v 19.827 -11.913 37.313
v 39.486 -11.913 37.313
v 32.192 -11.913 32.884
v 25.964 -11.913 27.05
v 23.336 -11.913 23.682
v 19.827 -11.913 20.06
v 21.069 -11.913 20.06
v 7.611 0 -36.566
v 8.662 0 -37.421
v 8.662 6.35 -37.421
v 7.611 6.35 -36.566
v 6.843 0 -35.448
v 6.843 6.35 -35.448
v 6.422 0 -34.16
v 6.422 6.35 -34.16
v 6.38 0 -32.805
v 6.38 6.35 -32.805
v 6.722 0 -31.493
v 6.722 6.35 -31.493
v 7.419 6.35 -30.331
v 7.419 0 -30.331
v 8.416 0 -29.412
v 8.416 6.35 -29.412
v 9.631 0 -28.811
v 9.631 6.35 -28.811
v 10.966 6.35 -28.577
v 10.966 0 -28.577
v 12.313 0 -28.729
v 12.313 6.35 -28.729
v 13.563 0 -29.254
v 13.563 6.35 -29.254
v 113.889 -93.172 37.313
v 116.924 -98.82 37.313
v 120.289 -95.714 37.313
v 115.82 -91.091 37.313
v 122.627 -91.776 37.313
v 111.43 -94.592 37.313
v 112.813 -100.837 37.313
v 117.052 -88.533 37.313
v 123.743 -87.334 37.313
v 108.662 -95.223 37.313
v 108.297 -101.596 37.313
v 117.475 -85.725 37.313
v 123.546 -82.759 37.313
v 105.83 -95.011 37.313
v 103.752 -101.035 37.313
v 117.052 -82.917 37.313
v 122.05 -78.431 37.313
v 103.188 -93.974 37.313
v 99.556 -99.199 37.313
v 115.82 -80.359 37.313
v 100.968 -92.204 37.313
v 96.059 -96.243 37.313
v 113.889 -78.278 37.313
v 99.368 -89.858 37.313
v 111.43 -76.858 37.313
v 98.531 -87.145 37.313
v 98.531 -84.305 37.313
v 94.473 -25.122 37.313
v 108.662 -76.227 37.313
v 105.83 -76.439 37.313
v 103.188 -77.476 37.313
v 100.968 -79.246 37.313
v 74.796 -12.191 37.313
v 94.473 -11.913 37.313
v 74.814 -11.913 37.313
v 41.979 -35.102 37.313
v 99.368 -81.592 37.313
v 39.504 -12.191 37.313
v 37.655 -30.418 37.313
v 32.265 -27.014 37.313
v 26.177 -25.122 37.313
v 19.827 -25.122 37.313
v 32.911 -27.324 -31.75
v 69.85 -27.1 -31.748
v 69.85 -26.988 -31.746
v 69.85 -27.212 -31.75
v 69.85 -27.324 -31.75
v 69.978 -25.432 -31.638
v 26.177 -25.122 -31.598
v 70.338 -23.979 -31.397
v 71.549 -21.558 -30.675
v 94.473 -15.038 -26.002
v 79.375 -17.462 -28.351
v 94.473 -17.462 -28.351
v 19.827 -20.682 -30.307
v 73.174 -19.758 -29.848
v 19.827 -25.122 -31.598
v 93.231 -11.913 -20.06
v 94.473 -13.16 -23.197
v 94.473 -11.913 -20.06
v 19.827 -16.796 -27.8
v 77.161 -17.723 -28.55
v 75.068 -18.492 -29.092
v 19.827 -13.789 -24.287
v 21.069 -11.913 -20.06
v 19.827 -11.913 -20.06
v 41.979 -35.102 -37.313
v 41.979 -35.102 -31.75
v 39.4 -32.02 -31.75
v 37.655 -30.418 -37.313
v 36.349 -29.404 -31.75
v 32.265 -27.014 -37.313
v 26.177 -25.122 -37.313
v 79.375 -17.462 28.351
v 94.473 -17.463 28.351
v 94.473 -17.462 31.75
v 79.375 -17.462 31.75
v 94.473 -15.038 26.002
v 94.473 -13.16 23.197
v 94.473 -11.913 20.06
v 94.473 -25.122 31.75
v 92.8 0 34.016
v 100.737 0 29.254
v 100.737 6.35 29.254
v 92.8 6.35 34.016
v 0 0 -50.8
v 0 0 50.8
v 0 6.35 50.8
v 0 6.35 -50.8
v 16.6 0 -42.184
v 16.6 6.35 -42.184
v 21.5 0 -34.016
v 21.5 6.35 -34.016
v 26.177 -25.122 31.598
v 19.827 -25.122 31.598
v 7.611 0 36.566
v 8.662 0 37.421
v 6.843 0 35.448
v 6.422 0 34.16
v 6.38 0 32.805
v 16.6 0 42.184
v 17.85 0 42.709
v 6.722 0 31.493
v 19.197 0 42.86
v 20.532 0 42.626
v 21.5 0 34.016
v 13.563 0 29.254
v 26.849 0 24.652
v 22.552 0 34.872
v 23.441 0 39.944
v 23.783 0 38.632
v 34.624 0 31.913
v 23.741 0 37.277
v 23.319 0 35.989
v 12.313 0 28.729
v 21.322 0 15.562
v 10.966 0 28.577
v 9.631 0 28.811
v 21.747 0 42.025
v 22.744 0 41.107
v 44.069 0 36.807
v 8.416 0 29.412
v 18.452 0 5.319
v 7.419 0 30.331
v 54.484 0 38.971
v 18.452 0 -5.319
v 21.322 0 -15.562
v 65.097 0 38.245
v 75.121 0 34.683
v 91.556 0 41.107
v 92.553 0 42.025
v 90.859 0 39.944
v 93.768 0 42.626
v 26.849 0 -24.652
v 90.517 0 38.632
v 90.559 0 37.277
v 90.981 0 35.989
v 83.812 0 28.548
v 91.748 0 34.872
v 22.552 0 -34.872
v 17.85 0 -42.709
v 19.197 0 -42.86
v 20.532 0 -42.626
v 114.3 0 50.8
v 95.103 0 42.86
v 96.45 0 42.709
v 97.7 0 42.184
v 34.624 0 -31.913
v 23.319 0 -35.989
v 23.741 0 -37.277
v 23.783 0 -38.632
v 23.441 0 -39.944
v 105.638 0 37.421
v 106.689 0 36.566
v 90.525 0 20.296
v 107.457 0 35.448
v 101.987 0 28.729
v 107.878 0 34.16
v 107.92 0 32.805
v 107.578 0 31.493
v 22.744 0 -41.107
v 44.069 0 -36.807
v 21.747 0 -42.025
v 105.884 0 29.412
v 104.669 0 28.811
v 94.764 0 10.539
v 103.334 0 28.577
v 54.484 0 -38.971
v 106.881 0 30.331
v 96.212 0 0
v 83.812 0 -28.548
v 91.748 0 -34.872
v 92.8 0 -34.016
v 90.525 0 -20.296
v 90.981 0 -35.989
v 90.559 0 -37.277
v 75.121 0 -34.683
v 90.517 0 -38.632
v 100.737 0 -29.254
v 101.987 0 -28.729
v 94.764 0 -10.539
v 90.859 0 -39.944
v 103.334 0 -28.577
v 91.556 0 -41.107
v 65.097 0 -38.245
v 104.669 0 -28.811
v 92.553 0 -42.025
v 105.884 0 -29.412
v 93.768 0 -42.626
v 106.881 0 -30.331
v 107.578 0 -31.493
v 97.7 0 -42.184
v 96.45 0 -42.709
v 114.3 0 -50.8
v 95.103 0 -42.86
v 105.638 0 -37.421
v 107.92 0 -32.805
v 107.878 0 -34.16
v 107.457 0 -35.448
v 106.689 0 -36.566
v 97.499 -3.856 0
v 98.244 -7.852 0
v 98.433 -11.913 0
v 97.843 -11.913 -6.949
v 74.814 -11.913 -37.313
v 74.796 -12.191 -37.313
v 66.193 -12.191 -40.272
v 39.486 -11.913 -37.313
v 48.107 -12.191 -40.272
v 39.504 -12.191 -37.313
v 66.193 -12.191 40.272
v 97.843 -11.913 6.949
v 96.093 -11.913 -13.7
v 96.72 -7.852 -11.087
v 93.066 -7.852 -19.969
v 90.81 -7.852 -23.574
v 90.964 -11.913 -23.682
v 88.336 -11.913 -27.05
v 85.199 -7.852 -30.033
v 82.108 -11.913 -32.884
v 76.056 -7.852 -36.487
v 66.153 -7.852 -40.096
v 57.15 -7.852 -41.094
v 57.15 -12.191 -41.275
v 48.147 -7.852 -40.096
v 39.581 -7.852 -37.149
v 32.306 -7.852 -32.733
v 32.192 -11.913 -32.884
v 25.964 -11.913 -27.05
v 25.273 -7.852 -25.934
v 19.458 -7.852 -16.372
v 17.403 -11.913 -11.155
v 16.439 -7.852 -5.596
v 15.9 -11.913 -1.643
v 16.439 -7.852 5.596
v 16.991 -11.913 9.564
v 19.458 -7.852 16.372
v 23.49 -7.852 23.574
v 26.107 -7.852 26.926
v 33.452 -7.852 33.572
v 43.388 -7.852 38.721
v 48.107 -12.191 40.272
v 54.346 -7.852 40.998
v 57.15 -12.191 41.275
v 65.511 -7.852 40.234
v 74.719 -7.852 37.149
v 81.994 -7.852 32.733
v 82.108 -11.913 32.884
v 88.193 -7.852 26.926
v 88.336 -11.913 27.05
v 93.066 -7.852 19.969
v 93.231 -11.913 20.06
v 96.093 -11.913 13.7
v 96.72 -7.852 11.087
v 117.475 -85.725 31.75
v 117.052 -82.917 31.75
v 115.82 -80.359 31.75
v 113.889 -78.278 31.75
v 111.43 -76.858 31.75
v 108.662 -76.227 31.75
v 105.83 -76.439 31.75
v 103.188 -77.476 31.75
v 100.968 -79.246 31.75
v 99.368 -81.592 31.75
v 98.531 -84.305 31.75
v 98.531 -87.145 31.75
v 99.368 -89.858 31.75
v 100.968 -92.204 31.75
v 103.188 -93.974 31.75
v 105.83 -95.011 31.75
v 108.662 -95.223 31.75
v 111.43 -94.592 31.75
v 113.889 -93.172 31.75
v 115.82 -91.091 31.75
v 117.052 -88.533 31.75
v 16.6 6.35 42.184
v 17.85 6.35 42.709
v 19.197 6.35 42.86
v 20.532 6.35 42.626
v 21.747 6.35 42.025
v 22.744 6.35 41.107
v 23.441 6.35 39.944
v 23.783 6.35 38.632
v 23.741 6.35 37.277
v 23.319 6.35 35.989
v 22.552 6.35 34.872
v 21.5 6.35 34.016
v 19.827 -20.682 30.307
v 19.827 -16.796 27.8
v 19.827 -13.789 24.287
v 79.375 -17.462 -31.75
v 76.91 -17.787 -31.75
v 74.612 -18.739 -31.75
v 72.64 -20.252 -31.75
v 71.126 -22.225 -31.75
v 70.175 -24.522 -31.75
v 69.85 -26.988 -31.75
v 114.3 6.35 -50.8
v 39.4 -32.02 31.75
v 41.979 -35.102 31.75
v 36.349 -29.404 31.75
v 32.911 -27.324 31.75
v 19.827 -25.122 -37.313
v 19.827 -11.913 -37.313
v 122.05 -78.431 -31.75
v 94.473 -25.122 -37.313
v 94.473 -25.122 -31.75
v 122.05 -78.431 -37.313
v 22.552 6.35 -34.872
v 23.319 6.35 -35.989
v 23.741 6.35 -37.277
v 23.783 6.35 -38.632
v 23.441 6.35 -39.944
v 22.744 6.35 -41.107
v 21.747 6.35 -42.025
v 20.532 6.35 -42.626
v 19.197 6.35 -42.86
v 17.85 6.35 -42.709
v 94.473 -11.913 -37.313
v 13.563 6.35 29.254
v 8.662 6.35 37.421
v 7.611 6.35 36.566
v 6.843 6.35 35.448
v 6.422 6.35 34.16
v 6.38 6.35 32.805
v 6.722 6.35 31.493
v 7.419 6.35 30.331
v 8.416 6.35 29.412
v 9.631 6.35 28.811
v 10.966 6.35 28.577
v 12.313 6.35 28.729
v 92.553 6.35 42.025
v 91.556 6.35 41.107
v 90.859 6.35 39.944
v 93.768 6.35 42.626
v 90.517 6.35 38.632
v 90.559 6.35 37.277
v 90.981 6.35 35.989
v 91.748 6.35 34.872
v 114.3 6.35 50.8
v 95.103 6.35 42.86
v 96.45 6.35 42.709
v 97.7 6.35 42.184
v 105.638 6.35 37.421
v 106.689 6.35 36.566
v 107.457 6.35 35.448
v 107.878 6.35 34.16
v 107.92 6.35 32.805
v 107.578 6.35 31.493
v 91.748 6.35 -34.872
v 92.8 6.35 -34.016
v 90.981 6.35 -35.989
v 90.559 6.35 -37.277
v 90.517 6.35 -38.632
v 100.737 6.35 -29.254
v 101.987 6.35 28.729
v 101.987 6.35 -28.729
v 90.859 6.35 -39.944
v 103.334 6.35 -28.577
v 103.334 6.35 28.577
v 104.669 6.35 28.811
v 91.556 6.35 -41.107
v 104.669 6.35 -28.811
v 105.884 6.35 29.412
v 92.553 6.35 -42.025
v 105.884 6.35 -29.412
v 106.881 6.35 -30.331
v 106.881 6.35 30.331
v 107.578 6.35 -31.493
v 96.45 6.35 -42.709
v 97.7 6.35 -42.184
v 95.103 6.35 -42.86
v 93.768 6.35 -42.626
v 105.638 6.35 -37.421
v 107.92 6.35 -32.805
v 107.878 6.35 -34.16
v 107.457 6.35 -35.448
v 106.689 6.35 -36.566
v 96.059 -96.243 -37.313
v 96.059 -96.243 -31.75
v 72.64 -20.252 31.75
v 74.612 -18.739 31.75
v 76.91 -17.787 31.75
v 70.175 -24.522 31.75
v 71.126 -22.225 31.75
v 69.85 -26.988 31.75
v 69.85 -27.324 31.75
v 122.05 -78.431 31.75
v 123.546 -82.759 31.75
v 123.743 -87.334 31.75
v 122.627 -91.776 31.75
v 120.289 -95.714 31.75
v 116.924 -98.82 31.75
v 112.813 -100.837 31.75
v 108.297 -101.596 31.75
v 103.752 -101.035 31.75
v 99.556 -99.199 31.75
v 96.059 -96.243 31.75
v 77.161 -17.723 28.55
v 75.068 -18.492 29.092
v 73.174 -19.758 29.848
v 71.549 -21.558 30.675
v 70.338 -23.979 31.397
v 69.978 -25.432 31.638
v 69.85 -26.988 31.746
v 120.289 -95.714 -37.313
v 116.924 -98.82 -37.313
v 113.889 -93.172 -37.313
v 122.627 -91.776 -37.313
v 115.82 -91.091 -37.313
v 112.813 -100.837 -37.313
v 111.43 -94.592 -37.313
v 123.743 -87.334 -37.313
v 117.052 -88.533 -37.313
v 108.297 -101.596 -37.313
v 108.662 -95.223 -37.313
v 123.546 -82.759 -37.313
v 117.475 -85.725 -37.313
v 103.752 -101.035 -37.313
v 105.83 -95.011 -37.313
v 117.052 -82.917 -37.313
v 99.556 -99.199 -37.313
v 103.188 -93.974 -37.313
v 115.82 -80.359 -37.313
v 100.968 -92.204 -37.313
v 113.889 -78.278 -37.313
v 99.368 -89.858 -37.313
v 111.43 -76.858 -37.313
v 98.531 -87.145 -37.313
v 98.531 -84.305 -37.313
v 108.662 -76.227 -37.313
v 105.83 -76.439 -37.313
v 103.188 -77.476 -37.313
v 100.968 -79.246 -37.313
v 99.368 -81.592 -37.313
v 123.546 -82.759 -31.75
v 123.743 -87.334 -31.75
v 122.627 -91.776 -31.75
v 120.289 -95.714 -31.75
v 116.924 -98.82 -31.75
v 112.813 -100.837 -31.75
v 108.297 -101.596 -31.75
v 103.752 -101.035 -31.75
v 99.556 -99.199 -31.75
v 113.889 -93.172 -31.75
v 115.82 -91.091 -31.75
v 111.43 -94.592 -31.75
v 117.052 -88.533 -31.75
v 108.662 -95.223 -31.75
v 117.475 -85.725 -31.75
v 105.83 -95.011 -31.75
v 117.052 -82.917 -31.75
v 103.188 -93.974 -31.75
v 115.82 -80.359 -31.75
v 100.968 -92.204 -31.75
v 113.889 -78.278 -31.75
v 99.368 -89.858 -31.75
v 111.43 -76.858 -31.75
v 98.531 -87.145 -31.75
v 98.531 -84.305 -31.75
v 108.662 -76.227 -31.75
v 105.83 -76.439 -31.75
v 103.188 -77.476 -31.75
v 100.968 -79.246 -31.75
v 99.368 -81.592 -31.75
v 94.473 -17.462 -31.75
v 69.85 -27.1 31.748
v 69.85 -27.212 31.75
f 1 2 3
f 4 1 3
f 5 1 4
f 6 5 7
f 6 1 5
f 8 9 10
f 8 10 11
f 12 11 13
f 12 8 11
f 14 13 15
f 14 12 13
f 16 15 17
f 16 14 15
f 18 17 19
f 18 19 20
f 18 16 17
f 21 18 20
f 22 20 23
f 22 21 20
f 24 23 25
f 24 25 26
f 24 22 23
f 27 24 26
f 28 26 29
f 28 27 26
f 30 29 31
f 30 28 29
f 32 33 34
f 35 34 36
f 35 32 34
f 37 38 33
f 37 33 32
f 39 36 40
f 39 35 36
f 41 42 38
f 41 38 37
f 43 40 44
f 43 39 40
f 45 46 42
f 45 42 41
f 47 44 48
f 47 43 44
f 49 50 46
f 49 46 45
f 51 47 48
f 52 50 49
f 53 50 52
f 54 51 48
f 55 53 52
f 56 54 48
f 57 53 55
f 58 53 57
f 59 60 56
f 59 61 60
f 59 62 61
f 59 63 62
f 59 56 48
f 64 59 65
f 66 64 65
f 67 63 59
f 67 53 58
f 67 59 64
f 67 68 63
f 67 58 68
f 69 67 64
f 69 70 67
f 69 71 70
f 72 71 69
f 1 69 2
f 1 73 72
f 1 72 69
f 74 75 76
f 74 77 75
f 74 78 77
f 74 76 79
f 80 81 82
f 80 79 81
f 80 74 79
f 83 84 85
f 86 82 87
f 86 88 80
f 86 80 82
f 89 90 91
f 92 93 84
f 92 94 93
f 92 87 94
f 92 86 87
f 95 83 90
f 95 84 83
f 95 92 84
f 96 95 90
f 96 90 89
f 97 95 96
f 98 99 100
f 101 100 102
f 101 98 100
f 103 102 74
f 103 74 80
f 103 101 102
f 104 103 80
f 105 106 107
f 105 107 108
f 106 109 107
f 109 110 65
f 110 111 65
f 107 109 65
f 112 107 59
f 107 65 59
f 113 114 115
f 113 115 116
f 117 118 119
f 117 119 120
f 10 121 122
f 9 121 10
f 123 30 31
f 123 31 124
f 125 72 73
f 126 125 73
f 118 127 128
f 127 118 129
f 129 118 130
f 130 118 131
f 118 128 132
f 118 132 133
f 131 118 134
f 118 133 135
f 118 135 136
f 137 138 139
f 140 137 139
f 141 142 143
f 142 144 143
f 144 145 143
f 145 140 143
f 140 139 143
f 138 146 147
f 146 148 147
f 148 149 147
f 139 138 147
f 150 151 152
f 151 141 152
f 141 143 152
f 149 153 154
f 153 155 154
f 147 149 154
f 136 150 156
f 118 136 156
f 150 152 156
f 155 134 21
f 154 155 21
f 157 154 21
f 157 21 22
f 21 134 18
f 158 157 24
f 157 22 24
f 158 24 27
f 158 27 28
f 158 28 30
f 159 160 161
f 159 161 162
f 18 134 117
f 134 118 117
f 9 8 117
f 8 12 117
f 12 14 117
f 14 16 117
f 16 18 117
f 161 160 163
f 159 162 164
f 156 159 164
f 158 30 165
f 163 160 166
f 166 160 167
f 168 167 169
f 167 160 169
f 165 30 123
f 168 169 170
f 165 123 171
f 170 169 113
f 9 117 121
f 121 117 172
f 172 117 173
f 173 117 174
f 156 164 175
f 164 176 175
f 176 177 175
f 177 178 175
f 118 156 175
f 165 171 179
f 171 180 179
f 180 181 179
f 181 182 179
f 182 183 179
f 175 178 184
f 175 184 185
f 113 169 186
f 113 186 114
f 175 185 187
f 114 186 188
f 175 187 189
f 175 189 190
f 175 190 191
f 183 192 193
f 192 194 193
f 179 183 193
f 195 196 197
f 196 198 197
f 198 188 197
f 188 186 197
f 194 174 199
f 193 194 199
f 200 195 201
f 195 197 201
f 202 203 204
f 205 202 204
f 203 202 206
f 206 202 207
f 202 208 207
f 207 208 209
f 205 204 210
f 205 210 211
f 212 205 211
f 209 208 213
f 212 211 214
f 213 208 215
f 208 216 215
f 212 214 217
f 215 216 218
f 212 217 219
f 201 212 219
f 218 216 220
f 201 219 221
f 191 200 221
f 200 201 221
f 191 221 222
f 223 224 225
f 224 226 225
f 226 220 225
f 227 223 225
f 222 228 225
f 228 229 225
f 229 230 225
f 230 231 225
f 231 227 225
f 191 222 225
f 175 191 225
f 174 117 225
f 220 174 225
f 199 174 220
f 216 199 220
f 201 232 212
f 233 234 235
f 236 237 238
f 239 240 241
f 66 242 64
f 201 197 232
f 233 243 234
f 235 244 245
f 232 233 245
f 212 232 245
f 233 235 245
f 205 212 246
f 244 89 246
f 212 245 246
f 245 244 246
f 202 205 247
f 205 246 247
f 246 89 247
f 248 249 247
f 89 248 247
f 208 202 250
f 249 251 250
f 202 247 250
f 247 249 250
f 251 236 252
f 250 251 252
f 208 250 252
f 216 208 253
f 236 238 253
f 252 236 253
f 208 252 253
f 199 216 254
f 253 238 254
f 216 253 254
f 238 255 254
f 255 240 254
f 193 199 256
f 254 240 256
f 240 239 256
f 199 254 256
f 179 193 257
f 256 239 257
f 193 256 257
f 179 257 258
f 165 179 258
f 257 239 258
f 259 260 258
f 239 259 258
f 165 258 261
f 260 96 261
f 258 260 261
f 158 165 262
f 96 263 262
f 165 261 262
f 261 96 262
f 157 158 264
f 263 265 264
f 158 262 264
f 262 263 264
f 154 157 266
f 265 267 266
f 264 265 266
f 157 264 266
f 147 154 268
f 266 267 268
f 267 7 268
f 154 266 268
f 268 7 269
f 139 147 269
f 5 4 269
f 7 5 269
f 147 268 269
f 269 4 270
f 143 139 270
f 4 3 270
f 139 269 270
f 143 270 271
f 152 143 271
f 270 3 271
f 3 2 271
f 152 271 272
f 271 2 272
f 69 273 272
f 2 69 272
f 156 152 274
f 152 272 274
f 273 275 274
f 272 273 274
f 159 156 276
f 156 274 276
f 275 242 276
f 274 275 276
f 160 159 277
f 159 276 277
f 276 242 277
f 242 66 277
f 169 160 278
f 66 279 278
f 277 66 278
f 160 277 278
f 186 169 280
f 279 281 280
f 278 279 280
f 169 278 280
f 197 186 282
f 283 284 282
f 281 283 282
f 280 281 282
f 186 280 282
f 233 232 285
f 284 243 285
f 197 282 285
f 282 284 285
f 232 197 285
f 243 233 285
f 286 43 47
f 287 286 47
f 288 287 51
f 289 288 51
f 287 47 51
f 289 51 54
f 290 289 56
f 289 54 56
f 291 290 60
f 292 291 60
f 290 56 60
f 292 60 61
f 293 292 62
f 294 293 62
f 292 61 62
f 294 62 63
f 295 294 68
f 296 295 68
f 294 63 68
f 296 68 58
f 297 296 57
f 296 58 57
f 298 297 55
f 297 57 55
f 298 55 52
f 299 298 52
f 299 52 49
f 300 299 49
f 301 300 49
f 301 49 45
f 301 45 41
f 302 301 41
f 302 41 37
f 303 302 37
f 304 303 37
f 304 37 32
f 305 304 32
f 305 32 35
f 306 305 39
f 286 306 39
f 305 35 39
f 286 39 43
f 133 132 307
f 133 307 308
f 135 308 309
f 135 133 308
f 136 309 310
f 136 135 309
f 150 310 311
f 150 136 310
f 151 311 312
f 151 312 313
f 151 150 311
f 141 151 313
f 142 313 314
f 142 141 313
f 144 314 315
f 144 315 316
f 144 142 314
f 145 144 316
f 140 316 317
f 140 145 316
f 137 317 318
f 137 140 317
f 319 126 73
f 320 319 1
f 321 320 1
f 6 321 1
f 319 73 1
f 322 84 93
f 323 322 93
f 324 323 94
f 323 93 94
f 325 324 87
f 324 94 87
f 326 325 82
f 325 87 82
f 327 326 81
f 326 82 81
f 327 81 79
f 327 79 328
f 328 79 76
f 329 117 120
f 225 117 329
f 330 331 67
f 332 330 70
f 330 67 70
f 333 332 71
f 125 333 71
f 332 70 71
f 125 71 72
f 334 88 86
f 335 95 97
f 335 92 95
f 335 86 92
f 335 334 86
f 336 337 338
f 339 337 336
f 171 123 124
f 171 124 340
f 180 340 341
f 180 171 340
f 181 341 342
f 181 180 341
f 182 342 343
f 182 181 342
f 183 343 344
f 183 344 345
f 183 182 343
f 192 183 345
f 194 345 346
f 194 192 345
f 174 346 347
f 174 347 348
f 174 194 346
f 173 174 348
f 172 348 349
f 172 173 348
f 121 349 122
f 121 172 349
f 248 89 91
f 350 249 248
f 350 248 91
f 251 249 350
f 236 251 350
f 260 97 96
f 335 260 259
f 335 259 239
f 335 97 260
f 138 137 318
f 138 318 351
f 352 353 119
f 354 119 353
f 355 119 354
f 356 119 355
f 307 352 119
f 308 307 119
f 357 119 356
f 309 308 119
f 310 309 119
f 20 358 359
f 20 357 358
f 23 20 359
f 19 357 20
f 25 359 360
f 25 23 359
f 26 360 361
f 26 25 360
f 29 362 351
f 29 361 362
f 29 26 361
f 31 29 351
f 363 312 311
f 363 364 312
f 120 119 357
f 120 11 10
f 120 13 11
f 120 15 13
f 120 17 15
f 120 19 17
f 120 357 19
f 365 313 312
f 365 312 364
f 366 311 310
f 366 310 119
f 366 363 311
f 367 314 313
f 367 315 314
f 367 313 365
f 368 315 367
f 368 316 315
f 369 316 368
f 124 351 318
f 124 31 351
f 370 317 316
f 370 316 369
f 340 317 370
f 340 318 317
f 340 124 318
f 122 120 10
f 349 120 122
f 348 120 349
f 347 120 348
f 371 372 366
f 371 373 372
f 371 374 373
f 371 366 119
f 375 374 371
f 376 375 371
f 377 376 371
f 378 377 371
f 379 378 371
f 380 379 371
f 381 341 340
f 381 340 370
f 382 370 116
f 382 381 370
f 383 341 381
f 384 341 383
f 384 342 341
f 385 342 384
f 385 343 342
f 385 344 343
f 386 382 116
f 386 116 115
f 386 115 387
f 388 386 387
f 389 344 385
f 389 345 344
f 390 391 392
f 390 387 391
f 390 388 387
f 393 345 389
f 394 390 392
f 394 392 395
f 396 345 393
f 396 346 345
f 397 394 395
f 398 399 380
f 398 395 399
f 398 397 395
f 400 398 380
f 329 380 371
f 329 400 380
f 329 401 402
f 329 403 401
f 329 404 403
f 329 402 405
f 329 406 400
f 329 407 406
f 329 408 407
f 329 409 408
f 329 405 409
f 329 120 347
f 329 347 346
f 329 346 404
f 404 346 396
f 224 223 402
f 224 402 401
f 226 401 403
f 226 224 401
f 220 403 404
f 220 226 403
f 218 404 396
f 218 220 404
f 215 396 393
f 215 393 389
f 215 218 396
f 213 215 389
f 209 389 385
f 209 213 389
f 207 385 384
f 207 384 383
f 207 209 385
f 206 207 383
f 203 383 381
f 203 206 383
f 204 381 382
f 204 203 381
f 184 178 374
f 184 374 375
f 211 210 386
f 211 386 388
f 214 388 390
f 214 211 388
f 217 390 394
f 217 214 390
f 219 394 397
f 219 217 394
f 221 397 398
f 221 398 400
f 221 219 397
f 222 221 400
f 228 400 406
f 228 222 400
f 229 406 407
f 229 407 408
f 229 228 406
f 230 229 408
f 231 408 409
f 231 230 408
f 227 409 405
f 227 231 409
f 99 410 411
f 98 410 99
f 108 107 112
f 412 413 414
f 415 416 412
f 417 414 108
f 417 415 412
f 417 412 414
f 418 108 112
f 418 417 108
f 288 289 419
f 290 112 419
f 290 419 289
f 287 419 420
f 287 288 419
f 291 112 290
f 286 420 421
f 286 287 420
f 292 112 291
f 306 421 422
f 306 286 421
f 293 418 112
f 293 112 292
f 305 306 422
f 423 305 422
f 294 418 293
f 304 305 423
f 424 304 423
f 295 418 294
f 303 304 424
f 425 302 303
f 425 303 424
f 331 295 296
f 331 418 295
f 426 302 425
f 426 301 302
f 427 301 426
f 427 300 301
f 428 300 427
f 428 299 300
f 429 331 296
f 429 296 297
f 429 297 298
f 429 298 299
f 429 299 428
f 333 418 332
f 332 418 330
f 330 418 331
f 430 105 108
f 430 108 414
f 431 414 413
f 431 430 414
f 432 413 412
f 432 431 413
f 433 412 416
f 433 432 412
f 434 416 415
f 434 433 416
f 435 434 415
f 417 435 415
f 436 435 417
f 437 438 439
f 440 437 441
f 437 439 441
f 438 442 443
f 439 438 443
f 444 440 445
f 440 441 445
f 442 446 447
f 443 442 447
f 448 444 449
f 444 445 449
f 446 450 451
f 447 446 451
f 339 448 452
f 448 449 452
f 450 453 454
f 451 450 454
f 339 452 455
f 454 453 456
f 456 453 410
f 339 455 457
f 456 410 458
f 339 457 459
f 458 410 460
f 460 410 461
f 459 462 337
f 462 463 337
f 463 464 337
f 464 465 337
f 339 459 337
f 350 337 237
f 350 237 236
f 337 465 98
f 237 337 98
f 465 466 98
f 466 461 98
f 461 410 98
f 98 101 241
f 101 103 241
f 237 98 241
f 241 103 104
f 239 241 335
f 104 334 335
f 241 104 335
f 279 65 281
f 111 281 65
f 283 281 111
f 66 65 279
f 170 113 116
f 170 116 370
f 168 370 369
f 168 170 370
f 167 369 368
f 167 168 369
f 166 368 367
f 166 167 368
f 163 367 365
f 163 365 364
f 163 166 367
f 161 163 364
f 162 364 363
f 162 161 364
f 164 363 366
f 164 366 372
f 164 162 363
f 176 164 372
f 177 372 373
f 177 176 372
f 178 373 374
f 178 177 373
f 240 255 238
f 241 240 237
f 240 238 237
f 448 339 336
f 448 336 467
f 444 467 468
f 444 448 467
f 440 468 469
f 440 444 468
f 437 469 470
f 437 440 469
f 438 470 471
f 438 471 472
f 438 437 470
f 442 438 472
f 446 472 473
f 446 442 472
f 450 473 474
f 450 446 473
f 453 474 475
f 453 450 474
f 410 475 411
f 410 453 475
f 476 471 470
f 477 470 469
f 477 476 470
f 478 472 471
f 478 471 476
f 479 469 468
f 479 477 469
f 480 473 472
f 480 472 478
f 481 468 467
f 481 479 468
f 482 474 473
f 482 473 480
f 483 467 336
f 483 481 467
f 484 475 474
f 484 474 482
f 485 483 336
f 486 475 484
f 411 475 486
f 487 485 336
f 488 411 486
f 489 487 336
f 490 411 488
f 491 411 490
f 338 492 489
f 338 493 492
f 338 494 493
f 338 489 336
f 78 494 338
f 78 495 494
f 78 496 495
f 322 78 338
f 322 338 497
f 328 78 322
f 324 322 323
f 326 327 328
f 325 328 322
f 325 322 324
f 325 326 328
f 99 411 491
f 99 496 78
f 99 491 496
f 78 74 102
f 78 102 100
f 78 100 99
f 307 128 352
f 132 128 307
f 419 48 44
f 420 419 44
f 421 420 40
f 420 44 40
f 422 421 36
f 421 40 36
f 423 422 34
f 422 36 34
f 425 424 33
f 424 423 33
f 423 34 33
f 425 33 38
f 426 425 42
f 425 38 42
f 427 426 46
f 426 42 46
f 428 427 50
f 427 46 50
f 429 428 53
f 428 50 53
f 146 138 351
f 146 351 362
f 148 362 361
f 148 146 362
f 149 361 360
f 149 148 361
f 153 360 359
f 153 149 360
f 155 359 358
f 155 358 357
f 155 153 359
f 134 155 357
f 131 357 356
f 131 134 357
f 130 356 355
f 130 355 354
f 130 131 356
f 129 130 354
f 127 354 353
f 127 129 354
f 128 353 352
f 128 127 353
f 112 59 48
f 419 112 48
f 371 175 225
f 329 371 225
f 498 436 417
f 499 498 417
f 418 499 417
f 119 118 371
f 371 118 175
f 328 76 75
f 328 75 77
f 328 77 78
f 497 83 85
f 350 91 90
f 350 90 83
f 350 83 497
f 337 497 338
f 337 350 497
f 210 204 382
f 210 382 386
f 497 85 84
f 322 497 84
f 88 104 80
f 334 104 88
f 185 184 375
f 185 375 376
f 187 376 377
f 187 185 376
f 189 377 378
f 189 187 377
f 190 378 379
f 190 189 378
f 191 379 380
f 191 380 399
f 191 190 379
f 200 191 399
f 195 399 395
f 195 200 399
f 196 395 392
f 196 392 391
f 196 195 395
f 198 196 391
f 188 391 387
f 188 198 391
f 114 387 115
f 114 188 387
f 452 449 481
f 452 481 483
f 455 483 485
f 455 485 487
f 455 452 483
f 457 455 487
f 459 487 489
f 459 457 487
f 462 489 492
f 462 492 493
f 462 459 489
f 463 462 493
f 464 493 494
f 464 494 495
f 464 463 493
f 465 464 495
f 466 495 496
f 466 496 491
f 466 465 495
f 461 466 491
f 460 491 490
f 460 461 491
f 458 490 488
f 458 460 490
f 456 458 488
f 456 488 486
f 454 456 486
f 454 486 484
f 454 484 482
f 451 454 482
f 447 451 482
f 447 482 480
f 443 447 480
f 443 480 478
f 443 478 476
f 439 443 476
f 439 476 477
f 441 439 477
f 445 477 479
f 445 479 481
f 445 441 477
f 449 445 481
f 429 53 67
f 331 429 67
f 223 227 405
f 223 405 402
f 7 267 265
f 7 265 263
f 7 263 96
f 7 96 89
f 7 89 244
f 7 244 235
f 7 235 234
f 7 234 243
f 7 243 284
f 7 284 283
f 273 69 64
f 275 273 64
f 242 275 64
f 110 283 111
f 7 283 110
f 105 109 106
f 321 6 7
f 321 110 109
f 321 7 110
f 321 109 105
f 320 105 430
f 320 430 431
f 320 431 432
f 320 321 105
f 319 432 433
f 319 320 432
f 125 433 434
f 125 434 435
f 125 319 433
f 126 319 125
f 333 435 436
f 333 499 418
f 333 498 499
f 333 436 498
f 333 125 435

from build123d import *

# Parameters (mm, degrees)
ESBO_O1_W                  = 114.3
ESBO_O1_H                  = 101.6
RESSALTO_EXTRUS_O1_DEPTH   = 6.35
ESBO_O3_W                  = 74.6252
ESBO_O3_H                  = 89.6874
RESSALTO_EXTRUS_O2_DEPTH   = 129.54
CORTE_EXTRUS_O1_DEPTH      = 129.54
CORTE_EXTRUS_O2_DEPTH      = 17.78
CORTE_EXTRUS_O3_DEPTH      = 17.78
ESBO_O7_R                  = 9.525
CORTE_EXTRUS_O4_DEPTH      = 5.5626
ESBO_O8_R                  = 9.525
CORTE_EXTRUS_O5_DEPTH      = 5.5626
CORTE_EXTRUS_O6_DEPTH      = 31.75
CORTE_EXTRUS_O6_DEPTH_BACK = 31.75


with BuildPart() as part:
    # Esboço1 → Ressalto-extrusão1 (new body)
    with BuildSketch(Plane(origin=(0, 0, 0), x_dir=(1, 0, 0), z_dir=(0, 1, 0))):
        with Locations((57.15, 0)):
            Rectangle(ESBO_O1_W, ESBO_O1_H)
        with BuildLine():
            Line((92.799713965, 34.016189941), (100.737213965, 29.253689941))
            ThreePointArc((100.737213965, 29.253689941), (107.271310059, 30.887213965), (105.637786035, 37.421310059))
            Line((105.637786035, 37.421310059), (97.700286035, 42.183810059))
            ThreePointArc((97.700286035, 42.183810059), (91.166189941, 40.550286035), (92.799713965, 34.016189941))
        make_face(mode=Mode.SUBTRACT)
        with BuildLine():
            Line((97.700286035, -42.183810059), (105.637786035, -37.421310059))
            ThreePointArc((105.637786035, -37.421310059), (107.271310059, -30.887213965), (100.737213965, -29.253689941))
            Line((100.737213965, -29.253689941), (92.799713965, -34.016189941))
            ThreePointArc((92.799713965, -34.016189941), (91.166189941, -40.550286035), (97.700286035, -42.183810059))
        make_face(mode=Mode.SUBTRACT)
        with BuildLine():
            Line((13.562786035, 29.253689941), (21.500286035, 34.016189941))
            ThreePointArc((21.500286035, 34.016189941), (23.133810059, 40.550286035), (16.599713965, 42.183810059))
            Line((16.599713965, 42.183810059), (8.662213965, 37.421310059))
            ThreePointArc((8.662213965, 37.421310059), (7.028689941, 30.887213965), (13.562786035, 29.253689941))
        make_face(mode=Mode.SUBTRACT)
        with BuildLine():
            Line((8.662213965, -37.421310059), (16.599713965, -42.183810059))
            ThreePointArc((16.599713965, -42.183810059), (23.133810059, -40.550286035), (21.500286035, -34.016189941))
            Line((21.500286035, -34.016189941), (13.562786035, -29.253689941))
            ThreePointArc((13.562786035, -29.253689941), (7.028689941, -30.887213965), (8.662213965, -37.421310059))
        make_face(mode=Mode.SUBTRACT)
    extrude(amount=RESSALTO_EXTRUS_O1_DEPTH)

    # Esboço2 → Revolução1 (revolve)
    with BuildSketch(Plane.XY):
        with BuildLine():
            Line((57.15, 0), (96.212075536, 0))
            ThreePointArc((96.212075536, 0), (97.965508733, -5.977876228), (98.425, -12.190637285))
            Line((98.425, -12.190637285), (57.15, -12.190637285))
            Line((57.15, -12.190637285), (57.15, 0))
        make_face()
    revolve(axis=Axis((57.15, -12.190637285, 0), (0, 1, 0)))

    # Esboço3 → Ressalto-extrusão2 (add)
    with BuildSketch(Plane(origin=(0, 0, 0), x_dir=(0, 0, -1), z_dir=(1, 0, 0))):
        with Locations((0, -56.7563)):
            Rectangle(ESBO_O3_W, ESBO_O3_H)
    extrude(amount=RESSALTO_EXTRUS_O2_DEPTH)

    # Esboço4 → Corte-extrusão1 (cut)
    with BuildSketch(Plane(origin=(0, 0, 0), x_dir=(0, 0, -1), z_dir=(1, 0, 0))):
        with BuildLine():
            Line((-31.75, -27.323981416), (-31.75, -101.6))
            Line((-31.75, -101.6), (31.75, -101.6))
            Line((31.75, -101.6), (31.75, -27.323981416))
            ThreePointArc((31.75, -27.323981416), (28.496991957, -17.652408672), (20.060406327, -11.9126))
            Line((20.060406327, -11.9126), (-20.060406327, -11.9126))
            ThreePointArc((-20.060406327, -11.9126), (-28.496991957, -17.652408672), (-31.75, -27.323981416))
        make_face()
    extrude(amount=CORTE_EXTRUS_O1_DEPTH, mode=Mode.SUBTRACT)

    # Esboço5 → Corte-extrusão2 (cut)
    with BuildSketch(Plane.XY.offset(37.3126)):
        with BuildLine():
            Line((0, -11.9126), (0, -113.5126))
            Line((0, -113.5126), (129.54, -113.5126))
            Line((129.54, -113.5126), (129.54, -11.9126))
            Line((129.54, -11.9126), (94.472692749, -11.9126))
            Line((94.472692749, -11.9126), (94.472692749, -25.121962715))
            Line((94.472692749, -25.121962715), (122.05004704, -78.430872329))
            ThreePointArc((122.05004704, -78.430872329), (116.924107122, -98.820076417), (96.059025593, -96.242621055))
            Line((96.059025593, -96.242621055), (41.979486254, -35.10156883))
            ThreePointArc((41.979486254, -35.10156883), (35.071399527, -28.539398345), (26.177307251, -25.121962715))
            Line((26.177307251, -25.121962715), (19.827307251, -25.121962715))
            Line((19.827307251, -25.121962715), (19.827307251, -11.9126))
            Line((19.827307251, -11.9126), (0, -11.9126))
        make_face()
    extrude(amount=-CORTE_EXTRUS_O2_DEPTH, mode=Mode.SUBTRACT)

    # Esboço6 → Corte-extrusão3 (cut)
    with BuildSketch(Plane.XY.offset(-37.3126)):
        with BuildLine():
            Line((0, -11.9126), (0, -113.5126))
            Line((0, -113.5126), (129.54, -113.5126))
            Line((129.54, -113.5126), (129.54, -11.9126))
            Line((129.54, -11.9126), (94.472692749, -11.9126))
            Line((94.472692749, -11.9126), (94.472692749, -25.121962715))
            Line((94.472692749, -25.121962715), (122.05004704, -78.430872329))
            ThreePointArc((122.05004704, -78.430872329), (116.924107122, -98.820076417), (96.059025593, -96.242621055))
            Line((96.059025593, -96.242621055), (41.979486254, -35.10156883))
            ThreePointArc((41.979486254, -35.10156883), (35.071399527, -28.539398345), (26.177307251, -25.121962715))
            Line((26.177307251, -25.121962715), (19.827307251, -25.121962715))
            Line((19.827307251, -25.121962715), (19.827307251, -11.9126))
            Line((19.827307251, -11.9126), (0, -11.9126))
        make_face()
    extrude(amount=CORTE_EXTRUS_O3_DEPTH, mode=Mode.SUBTRACT)

    # Esboço7 → Corte-extrusão4 (cut)
    with BuildSketch(Plane.XY.offset(37.3126)):
        with Locations((107.95, -85.725)):
            Circle(ESBO_O7_R)
    extrude(amount=-CORTE_EXTRUS_O4_DEPTH, mode=Mode.SUBTRACT)

    # Esboço8 → Corte-extrusão5 (cut)
    with BuildSketch(Plane.XY.offset(-37.3126)):
        with Locations((107.95, -85.725)):
            Circle(ESBO_O8_R)
    extrude(amount=CORTE_EXTRUS_O5_DEPTH, mode=Mode.SUBTRACT)

    # Esboço9 → Corte-extrusão6 (cut, two sides)
    with BuildSketch(Plane.XY) as corte_extrus_o6_sk:
        with BuildLine():
            Line((79.375, -65.0875), (150.000604013, -65.0875))
            ThreePointArc((150.000604013, -65.0875), (166.323156329, -59.148596729), (175.012790586, -44.109097315))
            Line((175.012790586, -44.109097315), (110.495145555, -17.4625))
            Line((110.495145555, -17.4625), (79.375, -17.4625))
            ThreePointArc((79.375, -17.4625), (72.639807909, -20.252307909), (69.85, -26.9875))
            Line((69.85, -26.9875), (69.85, -55.5625))
            ThreePointArc((69.85, -55.5625), (72.639807909, -62.297692091), (79.375, -65.0875))
        make_face()
    extrude(amount=CORTE_EXTRUS_O6_DEPTH, mode=Mode.SUBTRACT)
    extrude(corte_extrus_o6_sk.sketch, amount=-CORTE_EXTRUS_O6_DEPTH_BACK, mode=Mode.SUBTRACT)


solid = part.part
